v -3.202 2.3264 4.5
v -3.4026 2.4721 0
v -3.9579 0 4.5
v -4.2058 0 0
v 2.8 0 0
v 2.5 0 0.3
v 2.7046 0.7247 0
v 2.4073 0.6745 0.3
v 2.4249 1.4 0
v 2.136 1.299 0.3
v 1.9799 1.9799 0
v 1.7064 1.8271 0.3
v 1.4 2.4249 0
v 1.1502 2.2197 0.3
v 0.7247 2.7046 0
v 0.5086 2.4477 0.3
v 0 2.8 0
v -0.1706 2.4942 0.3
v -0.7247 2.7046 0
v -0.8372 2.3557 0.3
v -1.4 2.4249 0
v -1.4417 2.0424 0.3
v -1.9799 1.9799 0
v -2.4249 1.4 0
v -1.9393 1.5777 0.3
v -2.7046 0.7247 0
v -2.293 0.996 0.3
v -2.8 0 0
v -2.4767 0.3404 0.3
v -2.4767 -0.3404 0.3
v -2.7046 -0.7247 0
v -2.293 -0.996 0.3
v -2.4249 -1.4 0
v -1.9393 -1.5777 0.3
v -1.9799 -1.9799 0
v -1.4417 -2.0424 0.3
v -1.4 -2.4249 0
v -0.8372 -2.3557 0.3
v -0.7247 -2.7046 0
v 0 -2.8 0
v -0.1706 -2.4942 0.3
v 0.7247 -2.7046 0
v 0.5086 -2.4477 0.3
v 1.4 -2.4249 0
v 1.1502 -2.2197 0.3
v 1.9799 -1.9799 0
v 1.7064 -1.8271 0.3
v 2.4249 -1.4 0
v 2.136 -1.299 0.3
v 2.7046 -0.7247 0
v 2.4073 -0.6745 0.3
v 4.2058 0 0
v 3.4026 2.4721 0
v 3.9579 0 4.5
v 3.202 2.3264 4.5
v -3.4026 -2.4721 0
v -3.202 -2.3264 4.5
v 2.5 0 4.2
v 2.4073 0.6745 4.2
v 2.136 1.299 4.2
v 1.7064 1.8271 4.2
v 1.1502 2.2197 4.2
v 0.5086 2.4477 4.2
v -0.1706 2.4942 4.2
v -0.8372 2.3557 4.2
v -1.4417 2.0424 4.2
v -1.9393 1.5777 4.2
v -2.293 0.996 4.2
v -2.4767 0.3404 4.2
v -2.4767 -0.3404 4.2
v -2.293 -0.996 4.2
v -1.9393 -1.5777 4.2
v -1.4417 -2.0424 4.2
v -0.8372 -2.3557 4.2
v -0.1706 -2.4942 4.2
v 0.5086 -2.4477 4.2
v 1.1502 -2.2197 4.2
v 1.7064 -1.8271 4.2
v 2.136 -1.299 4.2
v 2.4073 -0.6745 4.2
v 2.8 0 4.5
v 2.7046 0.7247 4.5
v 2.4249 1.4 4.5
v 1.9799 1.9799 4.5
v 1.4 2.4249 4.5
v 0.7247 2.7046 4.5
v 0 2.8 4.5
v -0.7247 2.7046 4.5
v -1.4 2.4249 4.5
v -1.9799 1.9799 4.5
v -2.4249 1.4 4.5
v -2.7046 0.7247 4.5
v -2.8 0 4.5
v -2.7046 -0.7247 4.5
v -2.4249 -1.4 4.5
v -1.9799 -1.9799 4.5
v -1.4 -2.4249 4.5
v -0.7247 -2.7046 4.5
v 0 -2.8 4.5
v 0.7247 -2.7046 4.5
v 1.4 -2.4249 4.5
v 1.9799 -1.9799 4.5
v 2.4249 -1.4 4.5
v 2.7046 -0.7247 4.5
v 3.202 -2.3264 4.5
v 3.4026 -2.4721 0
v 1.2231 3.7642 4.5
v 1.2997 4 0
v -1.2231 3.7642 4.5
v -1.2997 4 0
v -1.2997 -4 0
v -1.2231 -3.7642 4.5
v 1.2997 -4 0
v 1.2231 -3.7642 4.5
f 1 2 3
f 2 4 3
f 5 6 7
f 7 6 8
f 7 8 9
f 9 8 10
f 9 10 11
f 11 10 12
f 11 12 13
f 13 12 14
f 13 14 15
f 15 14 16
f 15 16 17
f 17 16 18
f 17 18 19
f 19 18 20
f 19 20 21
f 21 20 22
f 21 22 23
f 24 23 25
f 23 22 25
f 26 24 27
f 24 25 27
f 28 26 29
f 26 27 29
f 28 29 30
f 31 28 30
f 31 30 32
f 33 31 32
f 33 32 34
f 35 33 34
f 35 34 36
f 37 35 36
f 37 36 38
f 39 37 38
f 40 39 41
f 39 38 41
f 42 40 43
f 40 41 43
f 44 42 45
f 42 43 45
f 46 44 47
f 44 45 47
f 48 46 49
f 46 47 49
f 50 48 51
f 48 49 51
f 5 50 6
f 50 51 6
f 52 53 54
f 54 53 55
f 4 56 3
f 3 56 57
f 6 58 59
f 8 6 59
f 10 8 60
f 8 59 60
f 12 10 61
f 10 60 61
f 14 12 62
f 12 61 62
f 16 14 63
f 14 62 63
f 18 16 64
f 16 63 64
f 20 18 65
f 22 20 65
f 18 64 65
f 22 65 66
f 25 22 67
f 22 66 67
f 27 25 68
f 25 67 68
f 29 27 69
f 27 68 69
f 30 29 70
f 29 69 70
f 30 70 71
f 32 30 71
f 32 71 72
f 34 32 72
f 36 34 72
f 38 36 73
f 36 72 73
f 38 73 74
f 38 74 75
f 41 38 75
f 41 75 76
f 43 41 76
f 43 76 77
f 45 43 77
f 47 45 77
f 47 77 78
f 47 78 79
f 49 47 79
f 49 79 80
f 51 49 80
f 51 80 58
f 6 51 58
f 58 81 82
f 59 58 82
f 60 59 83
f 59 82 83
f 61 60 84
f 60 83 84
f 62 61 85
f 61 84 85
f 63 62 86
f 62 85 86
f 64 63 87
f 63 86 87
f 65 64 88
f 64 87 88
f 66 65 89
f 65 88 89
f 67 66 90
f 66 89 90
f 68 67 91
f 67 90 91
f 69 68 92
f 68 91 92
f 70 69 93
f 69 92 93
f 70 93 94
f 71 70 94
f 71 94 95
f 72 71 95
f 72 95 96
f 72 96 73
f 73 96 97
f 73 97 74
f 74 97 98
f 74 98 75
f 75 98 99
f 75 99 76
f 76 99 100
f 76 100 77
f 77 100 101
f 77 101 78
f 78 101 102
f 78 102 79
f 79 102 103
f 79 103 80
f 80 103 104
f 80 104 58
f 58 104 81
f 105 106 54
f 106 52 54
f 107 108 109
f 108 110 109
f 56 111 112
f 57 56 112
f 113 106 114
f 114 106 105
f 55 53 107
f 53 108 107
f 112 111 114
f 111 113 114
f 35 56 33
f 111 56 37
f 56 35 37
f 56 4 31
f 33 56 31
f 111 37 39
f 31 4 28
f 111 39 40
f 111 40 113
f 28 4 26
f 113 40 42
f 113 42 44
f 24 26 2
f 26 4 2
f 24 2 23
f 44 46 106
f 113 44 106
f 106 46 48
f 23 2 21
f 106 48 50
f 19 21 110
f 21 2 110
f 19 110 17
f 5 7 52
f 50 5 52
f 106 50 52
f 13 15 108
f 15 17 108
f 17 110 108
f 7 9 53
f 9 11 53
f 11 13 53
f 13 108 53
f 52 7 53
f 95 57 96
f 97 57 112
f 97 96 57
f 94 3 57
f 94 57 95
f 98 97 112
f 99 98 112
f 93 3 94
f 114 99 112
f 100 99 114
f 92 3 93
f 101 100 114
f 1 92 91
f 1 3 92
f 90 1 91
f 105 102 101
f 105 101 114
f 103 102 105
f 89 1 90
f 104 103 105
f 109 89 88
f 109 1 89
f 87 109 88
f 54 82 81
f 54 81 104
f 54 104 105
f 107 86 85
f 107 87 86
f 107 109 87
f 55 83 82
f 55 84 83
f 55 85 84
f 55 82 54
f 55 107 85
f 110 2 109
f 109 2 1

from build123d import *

# Parameters (mm, degrees)
F1_DEPTH = 4.5
F1_TAPER = 3
F2_R     = 2.5
F3_DEPTH = 25
F4_SIZE  = 0.3


with BuildPart() as f1:
    # F0 (on Top) → F1 (new body)
    with BuildSketch(Plane.XY):
        Polygon((-1.2996787849, -4), (1.2996787849, -4), (3.4026032334, -2.472135955), (4.205848897, 0), (3.4026032334, 2.472135955), (1.2996787849, 4), (-1.2996787849, 4), (-3.4026032334, 2.472135955), (-4.205848897, 0), (-3.4026032334, -2.472135955), align=None)
    extrude(amount=F1_DEPTH, taper=F1_TAPER)

    # F2 (on face) → F3 (cut)
    with BuildSketch(Plane.XY.offset(4.5)):
        Circle(F2_R)
    extrude(amount=-F3_DEPTH, mode=Mode.SUBTRACT)

    # F4
    f4_edges = [f1.edges().sort_by_distance(p)[0] for p in [
        (-2.5, 0, 4.5),
        (-2.5, 0, 0),
    ]]
    chamfer(f4_edges, length=F4_SIZE)


solid = f1.part
